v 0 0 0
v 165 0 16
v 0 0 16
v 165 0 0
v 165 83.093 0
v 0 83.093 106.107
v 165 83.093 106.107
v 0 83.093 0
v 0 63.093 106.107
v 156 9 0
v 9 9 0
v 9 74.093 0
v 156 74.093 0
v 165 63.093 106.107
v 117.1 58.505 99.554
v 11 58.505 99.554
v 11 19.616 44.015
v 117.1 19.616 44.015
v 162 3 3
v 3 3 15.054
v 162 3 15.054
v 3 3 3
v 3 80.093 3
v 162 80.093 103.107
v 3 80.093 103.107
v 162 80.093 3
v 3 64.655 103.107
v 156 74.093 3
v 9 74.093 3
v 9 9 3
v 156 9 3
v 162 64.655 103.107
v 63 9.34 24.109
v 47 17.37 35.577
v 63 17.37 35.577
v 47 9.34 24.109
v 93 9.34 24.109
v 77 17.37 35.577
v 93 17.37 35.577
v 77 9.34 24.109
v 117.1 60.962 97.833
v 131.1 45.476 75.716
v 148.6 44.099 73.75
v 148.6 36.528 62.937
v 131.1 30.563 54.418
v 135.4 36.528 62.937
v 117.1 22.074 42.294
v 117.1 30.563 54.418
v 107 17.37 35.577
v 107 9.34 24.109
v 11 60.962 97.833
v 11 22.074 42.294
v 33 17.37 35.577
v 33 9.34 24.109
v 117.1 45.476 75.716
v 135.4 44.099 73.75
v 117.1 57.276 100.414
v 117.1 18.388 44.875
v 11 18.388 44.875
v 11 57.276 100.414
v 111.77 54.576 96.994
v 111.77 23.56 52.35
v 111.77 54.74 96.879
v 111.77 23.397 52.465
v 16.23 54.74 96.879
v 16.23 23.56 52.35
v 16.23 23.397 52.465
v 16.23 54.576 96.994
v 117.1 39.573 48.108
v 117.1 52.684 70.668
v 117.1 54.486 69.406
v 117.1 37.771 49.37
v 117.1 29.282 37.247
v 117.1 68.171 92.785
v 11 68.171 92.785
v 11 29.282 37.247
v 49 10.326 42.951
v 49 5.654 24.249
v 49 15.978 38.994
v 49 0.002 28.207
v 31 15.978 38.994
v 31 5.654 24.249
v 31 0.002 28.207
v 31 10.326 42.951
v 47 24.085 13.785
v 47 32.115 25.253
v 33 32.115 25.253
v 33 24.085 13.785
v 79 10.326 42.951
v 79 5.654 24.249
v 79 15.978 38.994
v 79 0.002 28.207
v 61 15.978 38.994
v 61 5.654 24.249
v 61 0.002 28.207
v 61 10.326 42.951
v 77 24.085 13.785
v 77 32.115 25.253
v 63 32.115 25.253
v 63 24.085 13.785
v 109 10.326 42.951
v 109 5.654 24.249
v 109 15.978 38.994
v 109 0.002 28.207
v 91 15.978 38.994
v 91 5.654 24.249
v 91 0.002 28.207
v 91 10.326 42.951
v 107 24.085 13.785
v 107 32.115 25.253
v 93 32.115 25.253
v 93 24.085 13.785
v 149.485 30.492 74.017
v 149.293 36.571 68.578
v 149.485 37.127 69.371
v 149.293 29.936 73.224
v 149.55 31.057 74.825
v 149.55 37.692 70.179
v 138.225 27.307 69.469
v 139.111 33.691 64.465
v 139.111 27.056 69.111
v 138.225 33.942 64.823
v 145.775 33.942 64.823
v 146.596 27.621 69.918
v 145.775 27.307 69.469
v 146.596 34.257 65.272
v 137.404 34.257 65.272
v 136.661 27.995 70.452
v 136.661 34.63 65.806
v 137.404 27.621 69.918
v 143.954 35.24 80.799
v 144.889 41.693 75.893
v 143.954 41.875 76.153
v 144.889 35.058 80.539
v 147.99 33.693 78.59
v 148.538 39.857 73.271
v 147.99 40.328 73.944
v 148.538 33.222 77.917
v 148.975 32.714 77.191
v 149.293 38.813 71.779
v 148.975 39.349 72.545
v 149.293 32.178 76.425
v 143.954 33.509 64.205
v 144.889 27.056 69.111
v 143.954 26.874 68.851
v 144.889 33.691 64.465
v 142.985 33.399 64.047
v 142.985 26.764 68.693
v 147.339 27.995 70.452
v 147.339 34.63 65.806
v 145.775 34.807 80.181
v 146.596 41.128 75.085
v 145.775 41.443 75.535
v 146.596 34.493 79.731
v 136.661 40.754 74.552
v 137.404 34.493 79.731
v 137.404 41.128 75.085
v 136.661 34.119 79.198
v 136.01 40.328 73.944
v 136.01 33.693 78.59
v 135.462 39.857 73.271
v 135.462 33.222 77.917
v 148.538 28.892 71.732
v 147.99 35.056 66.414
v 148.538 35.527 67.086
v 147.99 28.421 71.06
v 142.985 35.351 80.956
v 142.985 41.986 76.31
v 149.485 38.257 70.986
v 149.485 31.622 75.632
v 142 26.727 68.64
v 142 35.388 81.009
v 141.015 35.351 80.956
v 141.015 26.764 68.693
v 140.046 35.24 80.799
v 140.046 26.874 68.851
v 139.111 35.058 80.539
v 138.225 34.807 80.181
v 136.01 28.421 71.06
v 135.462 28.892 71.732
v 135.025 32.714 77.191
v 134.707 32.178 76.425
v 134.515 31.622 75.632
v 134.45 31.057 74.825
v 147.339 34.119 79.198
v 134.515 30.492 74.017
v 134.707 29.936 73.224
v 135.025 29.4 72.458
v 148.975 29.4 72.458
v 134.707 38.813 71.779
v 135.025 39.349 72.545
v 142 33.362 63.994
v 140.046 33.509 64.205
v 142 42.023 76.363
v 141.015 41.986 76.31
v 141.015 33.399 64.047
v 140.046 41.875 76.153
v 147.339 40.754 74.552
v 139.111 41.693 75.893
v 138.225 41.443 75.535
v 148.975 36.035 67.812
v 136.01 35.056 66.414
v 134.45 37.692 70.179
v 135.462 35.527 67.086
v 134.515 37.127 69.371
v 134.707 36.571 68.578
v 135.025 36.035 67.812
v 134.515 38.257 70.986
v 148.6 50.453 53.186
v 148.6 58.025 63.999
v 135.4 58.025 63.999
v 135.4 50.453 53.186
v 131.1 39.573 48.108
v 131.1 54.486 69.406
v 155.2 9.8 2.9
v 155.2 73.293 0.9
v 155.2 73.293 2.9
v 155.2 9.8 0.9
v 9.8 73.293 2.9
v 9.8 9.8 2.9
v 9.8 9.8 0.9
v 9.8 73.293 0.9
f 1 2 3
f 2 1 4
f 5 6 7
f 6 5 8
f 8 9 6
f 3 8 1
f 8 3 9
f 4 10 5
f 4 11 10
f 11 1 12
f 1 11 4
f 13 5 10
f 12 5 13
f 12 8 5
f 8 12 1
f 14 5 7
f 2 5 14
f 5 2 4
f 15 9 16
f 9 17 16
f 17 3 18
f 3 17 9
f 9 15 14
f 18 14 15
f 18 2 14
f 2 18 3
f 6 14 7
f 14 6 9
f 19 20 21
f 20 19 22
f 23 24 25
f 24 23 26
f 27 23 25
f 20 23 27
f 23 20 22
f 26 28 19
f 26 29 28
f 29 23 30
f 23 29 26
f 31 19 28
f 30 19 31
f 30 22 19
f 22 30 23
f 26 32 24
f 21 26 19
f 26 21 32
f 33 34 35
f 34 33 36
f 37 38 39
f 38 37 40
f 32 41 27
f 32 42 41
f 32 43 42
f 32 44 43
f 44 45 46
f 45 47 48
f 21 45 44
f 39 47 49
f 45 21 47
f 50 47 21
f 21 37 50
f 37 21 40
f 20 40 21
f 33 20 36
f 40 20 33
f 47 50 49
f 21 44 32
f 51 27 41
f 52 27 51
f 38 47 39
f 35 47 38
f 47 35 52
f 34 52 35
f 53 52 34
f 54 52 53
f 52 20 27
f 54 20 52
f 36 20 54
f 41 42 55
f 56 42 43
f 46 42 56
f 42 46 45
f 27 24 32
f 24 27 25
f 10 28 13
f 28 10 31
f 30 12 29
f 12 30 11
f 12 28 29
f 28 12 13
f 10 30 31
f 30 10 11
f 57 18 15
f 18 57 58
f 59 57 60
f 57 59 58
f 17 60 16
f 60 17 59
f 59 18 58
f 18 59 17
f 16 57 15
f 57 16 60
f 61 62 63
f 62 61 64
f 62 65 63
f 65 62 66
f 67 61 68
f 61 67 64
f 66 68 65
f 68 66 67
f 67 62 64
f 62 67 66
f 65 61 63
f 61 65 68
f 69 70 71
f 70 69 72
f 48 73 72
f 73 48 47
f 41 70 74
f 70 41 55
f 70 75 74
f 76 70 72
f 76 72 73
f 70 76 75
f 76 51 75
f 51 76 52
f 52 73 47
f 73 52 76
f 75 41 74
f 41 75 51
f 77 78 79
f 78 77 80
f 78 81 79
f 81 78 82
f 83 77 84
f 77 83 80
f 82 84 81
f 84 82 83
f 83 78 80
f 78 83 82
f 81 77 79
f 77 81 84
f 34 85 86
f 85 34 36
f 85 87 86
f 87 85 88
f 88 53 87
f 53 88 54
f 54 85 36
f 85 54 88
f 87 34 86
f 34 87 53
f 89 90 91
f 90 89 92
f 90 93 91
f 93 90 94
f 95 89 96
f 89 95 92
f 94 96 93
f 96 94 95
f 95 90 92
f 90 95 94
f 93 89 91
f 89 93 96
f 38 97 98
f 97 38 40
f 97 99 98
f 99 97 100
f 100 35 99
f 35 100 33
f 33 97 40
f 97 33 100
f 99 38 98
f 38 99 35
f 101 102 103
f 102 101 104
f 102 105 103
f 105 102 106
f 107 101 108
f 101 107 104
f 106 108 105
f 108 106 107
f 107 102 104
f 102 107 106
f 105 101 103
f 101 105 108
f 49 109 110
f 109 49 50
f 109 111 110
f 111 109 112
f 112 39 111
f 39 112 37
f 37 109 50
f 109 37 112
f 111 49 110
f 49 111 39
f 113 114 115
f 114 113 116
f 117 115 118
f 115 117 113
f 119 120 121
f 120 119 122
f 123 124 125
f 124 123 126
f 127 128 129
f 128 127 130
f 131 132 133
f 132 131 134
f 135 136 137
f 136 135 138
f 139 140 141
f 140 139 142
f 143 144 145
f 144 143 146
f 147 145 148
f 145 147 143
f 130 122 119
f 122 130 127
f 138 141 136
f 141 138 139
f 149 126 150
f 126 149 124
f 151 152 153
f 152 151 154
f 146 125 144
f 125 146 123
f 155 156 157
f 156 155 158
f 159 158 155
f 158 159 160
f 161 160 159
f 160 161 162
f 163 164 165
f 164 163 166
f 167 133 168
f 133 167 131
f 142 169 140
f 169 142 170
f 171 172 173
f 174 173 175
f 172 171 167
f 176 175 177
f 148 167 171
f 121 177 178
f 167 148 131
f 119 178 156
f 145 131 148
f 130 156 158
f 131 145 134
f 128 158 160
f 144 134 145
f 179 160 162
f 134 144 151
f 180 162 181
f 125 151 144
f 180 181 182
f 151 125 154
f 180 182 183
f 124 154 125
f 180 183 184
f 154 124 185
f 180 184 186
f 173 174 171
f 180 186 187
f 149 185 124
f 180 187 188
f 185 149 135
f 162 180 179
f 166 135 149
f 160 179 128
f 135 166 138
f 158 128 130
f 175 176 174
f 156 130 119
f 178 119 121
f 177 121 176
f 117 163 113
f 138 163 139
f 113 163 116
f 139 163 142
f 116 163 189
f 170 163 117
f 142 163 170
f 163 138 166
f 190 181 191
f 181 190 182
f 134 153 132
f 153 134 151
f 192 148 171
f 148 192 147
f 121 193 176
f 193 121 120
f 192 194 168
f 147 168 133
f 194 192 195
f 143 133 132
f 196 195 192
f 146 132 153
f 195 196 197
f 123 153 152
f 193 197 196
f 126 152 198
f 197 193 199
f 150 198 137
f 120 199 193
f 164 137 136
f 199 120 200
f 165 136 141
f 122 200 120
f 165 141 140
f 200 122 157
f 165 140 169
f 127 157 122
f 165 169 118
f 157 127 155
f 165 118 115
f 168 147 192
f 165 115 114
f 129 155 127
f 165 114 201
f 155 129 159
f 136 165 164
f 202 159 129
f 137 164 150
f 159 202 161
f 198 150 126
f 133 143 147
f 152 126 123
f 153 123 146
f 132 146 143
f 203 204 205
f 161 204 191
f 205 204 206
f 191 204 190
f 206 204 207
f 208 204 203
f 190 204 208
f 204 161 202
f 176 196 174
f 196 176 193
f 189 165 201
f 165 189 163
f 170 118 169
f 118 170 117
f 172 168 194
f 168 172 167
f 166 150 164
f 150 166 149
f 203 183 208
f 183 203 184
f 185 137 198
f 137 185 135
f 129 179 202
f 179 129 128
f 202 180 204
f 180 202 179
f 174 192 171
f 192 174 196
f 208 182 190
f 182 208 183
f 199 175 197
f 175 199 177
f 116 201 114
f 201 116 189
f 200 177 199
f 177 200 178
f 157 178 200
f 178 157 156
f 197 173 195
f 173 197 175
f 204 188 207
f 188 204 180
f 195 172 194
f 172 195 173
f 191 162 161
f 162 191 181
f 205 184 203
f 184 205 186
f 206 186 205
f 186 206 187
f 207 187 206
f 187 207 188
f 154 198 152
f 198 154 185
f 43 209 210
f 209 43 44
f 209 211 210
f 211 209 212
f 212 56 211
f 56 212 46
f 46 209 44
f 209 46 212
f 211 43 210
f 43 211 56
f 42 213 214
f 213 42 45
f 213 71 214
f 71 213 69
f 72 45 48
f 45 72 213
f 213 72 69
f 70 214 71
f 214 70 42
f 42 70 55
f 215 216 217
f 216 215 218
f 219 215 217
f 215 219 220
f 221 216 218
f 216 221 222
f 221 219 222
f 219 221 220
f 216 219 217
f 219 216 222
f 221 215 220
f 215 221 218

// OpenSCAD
/* Spotify Desk Thing — Phase 6 WEDGE PACKAGING CONCEPT (NOT FABRICATION CAD)
   All units millimetres. Sloping surface uses prior 165x110 face layout.
   Prototype envelopes only: holes, mounting, ports, depth/lead clearance,
   antenna restrictions and electrical safety are not production validated.
   Modes: "exterior", "ghost", "cutaway", "shell_only".
*/
$fn=48;
mode="exterior";
tilt_deg=55;             // degrees FROM desk/horizontal. PROVISIONAL.
face_width=165;         // across desktop. User has not approved case envelope.
face_length=110;        // along sloped face (not vertical height)
front_chin=16;          // keeps lower key bodies away from the floor. ASSUMED.
rear_roof=20;           // adds upper rear depth behind LCD. ASSUMED.
wall=3;                 // initial illustrative shell thickness
floor_lid_thickness=2;  // indicative bottom service hatch
face_run=face_length*cos(tilt_deg);
face_rise=face_length*sin(tilt_deg);
height_total=front_chin+face_rise;
depth_total=face_run+rear_roof;
screen_x=11; screen_v=8;
screen_w=106.1; screen_l=67.8;
visible_x=5.23; visible_v=4.35; visible_w=95.54; visible_l=54.36;
key_centres=[40,70,100]; key_v=91;
knob_x=142; knob_v=44;
profile_pts=[[0,0],[depth_total,0],[depth_total,height_total],
             [face_run,height_total],[0,front_chin]];
// x=width, v=down sloped face from top, w=inward normal to face.
module face_frame(){
 translate([0,face_run,height_total]) rotate([180+tilt_deg,0,0]) children();
}
module extruded_profile(pts,span=face_width){
 rotate([0,0,90]) rotate([90,0,0])
 linear_extrude(height=span,convexity=8) polygon(points=pts);
}
module shell_geometry(){
 difference(){
  extruded_profile(profile_pts);
  // Swept interior is a visual cavity, not structurally engineered.
  translate([wall,0,0]) rotate([0,0,90]) rotate([90,0,0])
   linear_extrude(height=face_width-2*wall,convexity=8)
    offset(delta=-wall) polygon(points=profile_pts);
  // Bottom hatch opening only, with no finished mounting clips/fasteners.
  translate([9,9,-1]) cube([face_width-18,depth_total-18,5]);
 }
}
module bottom_hatch(){
 color([.19,.22,.27,.85]) translate([9.8,9.8,.9])
  cube([face_width-19.6,depth_total-19.6,floor_lid_thickness]);
}
module screen_envelopes(){
 face_frame(){
  color([.06,.11,.16]) translate([screen_x,screen_v,-1.5])
   cube([screen_w,screen_l,1.55]);
  color([.12,.29,.35]) translate([screen_x+visible_x,screen_v+visible_v,-1.75])
   cube([visible_w,visible_l,.20]);
  // Screen module envelope behind face: 8.8mm is NOT verified max depth.
  color([.22,.60,.70,.62]) translate([screen_x,screen_v,wall])
   cube([screen_w,screen_l,8.8]);
  // These 98x60 nominal pitched markers are NOT drill holes.
  for(xx=[4,102],vv=[4,64]) color([.73,.36,.82])
   translate([screen_x+xx,screen_v+vv,wall+.1])
    cylinder(d=2.4,h=2.1);
 }
}
module keys_envelopes(){
 for(i=[0:2]) face_frame(){
  color([.82,.85,.90]) translate([key_centres[i]-9,key_v-9,-7])
   cube([18,18,6.9]);
  // 14x14 switch XY nominal; 18mm Z is a provisional package estimate.
  color([.45,.75,.83,.82]) translate([key_centres[i]-7,key_v-7,wall])
   cube([14,14,18]);
 }
}
module knob_encoder_envelopes(){
 face_frame(){
  // Exposes ~8mm of KZ0087: styling intent, actual fit not certified.
  color([.19,.22,.26]) translate([knob_x,knob_v,-8.3])
   cylinder(d=15.1,h=8.1);
  // 13.2mm body XY nominal; 17mm inwards INCLUDING LEADS is assumed.
  color([.58,.62,.69,.92]) translate([knob_x-6.6,knob_v-6.6,wall])
   cube([13.2,13.2,17]);
  // 14x26x11 side corridor: invented I2C plug/cable allowance.
  color([1,.60,.20,.27]) translate([screen_x+screen_w,screen_v+27,wall])
   cube([14,26,11]);
 }
}
module aw_expander(){
 // Candidate accessible horizontal location near removable base, unverified.
 color([.71,.44,.81,.85]) translate([24,43,10]) cube([38,23,1.6]);
 color([.86,.73,.92,.7]) translate([27,46,11.6]) cube([6,6,4]);
}
module service_envelopes(){
 // Zones ONLY (left USB, rear cable/exit), not port cutouts.
 color([.98,.79,.40,.3]) translate([2,25,22]) cube([10,21,13]);
 color([.25,.82,.52,.25]) translate([face_width-19,depth_total-10,14])
  cube([13,8,12]);
}
if(mode=="exterior"){
 color([.17,.20,.23,.98]) shell_geometry(); bottom_hatch();
 screen_envelopes(); keys_envelopes(); knob_encoder_envelopes();
}
else if(mode=="ghost"){
 color([.55,.66,.73,.20]) shell_geometry(); bottom_hatch();
 screen_envelopes(); keys_envelopes(); knob_encoder_envelopes();
 aw_expander(); service_envelopes();
}
else if(mode=="cutaway"){
 color([.48,.56,.65,.32]) difference(){
  shell_geometry();
  translate([-1,-1,-1])
   cube([face_width*.38,depth_total+2,height_total+2]);
 }
 bottom_hatch(); screen_envelopes();keys_envelopes();
 knob_encoder_envelopes();aw_expander();service_envelopes();
}
else if(mode=="shell_only"){
 color([.5,.59,.65]) shell_geometry(); bottom_hatch();
}
